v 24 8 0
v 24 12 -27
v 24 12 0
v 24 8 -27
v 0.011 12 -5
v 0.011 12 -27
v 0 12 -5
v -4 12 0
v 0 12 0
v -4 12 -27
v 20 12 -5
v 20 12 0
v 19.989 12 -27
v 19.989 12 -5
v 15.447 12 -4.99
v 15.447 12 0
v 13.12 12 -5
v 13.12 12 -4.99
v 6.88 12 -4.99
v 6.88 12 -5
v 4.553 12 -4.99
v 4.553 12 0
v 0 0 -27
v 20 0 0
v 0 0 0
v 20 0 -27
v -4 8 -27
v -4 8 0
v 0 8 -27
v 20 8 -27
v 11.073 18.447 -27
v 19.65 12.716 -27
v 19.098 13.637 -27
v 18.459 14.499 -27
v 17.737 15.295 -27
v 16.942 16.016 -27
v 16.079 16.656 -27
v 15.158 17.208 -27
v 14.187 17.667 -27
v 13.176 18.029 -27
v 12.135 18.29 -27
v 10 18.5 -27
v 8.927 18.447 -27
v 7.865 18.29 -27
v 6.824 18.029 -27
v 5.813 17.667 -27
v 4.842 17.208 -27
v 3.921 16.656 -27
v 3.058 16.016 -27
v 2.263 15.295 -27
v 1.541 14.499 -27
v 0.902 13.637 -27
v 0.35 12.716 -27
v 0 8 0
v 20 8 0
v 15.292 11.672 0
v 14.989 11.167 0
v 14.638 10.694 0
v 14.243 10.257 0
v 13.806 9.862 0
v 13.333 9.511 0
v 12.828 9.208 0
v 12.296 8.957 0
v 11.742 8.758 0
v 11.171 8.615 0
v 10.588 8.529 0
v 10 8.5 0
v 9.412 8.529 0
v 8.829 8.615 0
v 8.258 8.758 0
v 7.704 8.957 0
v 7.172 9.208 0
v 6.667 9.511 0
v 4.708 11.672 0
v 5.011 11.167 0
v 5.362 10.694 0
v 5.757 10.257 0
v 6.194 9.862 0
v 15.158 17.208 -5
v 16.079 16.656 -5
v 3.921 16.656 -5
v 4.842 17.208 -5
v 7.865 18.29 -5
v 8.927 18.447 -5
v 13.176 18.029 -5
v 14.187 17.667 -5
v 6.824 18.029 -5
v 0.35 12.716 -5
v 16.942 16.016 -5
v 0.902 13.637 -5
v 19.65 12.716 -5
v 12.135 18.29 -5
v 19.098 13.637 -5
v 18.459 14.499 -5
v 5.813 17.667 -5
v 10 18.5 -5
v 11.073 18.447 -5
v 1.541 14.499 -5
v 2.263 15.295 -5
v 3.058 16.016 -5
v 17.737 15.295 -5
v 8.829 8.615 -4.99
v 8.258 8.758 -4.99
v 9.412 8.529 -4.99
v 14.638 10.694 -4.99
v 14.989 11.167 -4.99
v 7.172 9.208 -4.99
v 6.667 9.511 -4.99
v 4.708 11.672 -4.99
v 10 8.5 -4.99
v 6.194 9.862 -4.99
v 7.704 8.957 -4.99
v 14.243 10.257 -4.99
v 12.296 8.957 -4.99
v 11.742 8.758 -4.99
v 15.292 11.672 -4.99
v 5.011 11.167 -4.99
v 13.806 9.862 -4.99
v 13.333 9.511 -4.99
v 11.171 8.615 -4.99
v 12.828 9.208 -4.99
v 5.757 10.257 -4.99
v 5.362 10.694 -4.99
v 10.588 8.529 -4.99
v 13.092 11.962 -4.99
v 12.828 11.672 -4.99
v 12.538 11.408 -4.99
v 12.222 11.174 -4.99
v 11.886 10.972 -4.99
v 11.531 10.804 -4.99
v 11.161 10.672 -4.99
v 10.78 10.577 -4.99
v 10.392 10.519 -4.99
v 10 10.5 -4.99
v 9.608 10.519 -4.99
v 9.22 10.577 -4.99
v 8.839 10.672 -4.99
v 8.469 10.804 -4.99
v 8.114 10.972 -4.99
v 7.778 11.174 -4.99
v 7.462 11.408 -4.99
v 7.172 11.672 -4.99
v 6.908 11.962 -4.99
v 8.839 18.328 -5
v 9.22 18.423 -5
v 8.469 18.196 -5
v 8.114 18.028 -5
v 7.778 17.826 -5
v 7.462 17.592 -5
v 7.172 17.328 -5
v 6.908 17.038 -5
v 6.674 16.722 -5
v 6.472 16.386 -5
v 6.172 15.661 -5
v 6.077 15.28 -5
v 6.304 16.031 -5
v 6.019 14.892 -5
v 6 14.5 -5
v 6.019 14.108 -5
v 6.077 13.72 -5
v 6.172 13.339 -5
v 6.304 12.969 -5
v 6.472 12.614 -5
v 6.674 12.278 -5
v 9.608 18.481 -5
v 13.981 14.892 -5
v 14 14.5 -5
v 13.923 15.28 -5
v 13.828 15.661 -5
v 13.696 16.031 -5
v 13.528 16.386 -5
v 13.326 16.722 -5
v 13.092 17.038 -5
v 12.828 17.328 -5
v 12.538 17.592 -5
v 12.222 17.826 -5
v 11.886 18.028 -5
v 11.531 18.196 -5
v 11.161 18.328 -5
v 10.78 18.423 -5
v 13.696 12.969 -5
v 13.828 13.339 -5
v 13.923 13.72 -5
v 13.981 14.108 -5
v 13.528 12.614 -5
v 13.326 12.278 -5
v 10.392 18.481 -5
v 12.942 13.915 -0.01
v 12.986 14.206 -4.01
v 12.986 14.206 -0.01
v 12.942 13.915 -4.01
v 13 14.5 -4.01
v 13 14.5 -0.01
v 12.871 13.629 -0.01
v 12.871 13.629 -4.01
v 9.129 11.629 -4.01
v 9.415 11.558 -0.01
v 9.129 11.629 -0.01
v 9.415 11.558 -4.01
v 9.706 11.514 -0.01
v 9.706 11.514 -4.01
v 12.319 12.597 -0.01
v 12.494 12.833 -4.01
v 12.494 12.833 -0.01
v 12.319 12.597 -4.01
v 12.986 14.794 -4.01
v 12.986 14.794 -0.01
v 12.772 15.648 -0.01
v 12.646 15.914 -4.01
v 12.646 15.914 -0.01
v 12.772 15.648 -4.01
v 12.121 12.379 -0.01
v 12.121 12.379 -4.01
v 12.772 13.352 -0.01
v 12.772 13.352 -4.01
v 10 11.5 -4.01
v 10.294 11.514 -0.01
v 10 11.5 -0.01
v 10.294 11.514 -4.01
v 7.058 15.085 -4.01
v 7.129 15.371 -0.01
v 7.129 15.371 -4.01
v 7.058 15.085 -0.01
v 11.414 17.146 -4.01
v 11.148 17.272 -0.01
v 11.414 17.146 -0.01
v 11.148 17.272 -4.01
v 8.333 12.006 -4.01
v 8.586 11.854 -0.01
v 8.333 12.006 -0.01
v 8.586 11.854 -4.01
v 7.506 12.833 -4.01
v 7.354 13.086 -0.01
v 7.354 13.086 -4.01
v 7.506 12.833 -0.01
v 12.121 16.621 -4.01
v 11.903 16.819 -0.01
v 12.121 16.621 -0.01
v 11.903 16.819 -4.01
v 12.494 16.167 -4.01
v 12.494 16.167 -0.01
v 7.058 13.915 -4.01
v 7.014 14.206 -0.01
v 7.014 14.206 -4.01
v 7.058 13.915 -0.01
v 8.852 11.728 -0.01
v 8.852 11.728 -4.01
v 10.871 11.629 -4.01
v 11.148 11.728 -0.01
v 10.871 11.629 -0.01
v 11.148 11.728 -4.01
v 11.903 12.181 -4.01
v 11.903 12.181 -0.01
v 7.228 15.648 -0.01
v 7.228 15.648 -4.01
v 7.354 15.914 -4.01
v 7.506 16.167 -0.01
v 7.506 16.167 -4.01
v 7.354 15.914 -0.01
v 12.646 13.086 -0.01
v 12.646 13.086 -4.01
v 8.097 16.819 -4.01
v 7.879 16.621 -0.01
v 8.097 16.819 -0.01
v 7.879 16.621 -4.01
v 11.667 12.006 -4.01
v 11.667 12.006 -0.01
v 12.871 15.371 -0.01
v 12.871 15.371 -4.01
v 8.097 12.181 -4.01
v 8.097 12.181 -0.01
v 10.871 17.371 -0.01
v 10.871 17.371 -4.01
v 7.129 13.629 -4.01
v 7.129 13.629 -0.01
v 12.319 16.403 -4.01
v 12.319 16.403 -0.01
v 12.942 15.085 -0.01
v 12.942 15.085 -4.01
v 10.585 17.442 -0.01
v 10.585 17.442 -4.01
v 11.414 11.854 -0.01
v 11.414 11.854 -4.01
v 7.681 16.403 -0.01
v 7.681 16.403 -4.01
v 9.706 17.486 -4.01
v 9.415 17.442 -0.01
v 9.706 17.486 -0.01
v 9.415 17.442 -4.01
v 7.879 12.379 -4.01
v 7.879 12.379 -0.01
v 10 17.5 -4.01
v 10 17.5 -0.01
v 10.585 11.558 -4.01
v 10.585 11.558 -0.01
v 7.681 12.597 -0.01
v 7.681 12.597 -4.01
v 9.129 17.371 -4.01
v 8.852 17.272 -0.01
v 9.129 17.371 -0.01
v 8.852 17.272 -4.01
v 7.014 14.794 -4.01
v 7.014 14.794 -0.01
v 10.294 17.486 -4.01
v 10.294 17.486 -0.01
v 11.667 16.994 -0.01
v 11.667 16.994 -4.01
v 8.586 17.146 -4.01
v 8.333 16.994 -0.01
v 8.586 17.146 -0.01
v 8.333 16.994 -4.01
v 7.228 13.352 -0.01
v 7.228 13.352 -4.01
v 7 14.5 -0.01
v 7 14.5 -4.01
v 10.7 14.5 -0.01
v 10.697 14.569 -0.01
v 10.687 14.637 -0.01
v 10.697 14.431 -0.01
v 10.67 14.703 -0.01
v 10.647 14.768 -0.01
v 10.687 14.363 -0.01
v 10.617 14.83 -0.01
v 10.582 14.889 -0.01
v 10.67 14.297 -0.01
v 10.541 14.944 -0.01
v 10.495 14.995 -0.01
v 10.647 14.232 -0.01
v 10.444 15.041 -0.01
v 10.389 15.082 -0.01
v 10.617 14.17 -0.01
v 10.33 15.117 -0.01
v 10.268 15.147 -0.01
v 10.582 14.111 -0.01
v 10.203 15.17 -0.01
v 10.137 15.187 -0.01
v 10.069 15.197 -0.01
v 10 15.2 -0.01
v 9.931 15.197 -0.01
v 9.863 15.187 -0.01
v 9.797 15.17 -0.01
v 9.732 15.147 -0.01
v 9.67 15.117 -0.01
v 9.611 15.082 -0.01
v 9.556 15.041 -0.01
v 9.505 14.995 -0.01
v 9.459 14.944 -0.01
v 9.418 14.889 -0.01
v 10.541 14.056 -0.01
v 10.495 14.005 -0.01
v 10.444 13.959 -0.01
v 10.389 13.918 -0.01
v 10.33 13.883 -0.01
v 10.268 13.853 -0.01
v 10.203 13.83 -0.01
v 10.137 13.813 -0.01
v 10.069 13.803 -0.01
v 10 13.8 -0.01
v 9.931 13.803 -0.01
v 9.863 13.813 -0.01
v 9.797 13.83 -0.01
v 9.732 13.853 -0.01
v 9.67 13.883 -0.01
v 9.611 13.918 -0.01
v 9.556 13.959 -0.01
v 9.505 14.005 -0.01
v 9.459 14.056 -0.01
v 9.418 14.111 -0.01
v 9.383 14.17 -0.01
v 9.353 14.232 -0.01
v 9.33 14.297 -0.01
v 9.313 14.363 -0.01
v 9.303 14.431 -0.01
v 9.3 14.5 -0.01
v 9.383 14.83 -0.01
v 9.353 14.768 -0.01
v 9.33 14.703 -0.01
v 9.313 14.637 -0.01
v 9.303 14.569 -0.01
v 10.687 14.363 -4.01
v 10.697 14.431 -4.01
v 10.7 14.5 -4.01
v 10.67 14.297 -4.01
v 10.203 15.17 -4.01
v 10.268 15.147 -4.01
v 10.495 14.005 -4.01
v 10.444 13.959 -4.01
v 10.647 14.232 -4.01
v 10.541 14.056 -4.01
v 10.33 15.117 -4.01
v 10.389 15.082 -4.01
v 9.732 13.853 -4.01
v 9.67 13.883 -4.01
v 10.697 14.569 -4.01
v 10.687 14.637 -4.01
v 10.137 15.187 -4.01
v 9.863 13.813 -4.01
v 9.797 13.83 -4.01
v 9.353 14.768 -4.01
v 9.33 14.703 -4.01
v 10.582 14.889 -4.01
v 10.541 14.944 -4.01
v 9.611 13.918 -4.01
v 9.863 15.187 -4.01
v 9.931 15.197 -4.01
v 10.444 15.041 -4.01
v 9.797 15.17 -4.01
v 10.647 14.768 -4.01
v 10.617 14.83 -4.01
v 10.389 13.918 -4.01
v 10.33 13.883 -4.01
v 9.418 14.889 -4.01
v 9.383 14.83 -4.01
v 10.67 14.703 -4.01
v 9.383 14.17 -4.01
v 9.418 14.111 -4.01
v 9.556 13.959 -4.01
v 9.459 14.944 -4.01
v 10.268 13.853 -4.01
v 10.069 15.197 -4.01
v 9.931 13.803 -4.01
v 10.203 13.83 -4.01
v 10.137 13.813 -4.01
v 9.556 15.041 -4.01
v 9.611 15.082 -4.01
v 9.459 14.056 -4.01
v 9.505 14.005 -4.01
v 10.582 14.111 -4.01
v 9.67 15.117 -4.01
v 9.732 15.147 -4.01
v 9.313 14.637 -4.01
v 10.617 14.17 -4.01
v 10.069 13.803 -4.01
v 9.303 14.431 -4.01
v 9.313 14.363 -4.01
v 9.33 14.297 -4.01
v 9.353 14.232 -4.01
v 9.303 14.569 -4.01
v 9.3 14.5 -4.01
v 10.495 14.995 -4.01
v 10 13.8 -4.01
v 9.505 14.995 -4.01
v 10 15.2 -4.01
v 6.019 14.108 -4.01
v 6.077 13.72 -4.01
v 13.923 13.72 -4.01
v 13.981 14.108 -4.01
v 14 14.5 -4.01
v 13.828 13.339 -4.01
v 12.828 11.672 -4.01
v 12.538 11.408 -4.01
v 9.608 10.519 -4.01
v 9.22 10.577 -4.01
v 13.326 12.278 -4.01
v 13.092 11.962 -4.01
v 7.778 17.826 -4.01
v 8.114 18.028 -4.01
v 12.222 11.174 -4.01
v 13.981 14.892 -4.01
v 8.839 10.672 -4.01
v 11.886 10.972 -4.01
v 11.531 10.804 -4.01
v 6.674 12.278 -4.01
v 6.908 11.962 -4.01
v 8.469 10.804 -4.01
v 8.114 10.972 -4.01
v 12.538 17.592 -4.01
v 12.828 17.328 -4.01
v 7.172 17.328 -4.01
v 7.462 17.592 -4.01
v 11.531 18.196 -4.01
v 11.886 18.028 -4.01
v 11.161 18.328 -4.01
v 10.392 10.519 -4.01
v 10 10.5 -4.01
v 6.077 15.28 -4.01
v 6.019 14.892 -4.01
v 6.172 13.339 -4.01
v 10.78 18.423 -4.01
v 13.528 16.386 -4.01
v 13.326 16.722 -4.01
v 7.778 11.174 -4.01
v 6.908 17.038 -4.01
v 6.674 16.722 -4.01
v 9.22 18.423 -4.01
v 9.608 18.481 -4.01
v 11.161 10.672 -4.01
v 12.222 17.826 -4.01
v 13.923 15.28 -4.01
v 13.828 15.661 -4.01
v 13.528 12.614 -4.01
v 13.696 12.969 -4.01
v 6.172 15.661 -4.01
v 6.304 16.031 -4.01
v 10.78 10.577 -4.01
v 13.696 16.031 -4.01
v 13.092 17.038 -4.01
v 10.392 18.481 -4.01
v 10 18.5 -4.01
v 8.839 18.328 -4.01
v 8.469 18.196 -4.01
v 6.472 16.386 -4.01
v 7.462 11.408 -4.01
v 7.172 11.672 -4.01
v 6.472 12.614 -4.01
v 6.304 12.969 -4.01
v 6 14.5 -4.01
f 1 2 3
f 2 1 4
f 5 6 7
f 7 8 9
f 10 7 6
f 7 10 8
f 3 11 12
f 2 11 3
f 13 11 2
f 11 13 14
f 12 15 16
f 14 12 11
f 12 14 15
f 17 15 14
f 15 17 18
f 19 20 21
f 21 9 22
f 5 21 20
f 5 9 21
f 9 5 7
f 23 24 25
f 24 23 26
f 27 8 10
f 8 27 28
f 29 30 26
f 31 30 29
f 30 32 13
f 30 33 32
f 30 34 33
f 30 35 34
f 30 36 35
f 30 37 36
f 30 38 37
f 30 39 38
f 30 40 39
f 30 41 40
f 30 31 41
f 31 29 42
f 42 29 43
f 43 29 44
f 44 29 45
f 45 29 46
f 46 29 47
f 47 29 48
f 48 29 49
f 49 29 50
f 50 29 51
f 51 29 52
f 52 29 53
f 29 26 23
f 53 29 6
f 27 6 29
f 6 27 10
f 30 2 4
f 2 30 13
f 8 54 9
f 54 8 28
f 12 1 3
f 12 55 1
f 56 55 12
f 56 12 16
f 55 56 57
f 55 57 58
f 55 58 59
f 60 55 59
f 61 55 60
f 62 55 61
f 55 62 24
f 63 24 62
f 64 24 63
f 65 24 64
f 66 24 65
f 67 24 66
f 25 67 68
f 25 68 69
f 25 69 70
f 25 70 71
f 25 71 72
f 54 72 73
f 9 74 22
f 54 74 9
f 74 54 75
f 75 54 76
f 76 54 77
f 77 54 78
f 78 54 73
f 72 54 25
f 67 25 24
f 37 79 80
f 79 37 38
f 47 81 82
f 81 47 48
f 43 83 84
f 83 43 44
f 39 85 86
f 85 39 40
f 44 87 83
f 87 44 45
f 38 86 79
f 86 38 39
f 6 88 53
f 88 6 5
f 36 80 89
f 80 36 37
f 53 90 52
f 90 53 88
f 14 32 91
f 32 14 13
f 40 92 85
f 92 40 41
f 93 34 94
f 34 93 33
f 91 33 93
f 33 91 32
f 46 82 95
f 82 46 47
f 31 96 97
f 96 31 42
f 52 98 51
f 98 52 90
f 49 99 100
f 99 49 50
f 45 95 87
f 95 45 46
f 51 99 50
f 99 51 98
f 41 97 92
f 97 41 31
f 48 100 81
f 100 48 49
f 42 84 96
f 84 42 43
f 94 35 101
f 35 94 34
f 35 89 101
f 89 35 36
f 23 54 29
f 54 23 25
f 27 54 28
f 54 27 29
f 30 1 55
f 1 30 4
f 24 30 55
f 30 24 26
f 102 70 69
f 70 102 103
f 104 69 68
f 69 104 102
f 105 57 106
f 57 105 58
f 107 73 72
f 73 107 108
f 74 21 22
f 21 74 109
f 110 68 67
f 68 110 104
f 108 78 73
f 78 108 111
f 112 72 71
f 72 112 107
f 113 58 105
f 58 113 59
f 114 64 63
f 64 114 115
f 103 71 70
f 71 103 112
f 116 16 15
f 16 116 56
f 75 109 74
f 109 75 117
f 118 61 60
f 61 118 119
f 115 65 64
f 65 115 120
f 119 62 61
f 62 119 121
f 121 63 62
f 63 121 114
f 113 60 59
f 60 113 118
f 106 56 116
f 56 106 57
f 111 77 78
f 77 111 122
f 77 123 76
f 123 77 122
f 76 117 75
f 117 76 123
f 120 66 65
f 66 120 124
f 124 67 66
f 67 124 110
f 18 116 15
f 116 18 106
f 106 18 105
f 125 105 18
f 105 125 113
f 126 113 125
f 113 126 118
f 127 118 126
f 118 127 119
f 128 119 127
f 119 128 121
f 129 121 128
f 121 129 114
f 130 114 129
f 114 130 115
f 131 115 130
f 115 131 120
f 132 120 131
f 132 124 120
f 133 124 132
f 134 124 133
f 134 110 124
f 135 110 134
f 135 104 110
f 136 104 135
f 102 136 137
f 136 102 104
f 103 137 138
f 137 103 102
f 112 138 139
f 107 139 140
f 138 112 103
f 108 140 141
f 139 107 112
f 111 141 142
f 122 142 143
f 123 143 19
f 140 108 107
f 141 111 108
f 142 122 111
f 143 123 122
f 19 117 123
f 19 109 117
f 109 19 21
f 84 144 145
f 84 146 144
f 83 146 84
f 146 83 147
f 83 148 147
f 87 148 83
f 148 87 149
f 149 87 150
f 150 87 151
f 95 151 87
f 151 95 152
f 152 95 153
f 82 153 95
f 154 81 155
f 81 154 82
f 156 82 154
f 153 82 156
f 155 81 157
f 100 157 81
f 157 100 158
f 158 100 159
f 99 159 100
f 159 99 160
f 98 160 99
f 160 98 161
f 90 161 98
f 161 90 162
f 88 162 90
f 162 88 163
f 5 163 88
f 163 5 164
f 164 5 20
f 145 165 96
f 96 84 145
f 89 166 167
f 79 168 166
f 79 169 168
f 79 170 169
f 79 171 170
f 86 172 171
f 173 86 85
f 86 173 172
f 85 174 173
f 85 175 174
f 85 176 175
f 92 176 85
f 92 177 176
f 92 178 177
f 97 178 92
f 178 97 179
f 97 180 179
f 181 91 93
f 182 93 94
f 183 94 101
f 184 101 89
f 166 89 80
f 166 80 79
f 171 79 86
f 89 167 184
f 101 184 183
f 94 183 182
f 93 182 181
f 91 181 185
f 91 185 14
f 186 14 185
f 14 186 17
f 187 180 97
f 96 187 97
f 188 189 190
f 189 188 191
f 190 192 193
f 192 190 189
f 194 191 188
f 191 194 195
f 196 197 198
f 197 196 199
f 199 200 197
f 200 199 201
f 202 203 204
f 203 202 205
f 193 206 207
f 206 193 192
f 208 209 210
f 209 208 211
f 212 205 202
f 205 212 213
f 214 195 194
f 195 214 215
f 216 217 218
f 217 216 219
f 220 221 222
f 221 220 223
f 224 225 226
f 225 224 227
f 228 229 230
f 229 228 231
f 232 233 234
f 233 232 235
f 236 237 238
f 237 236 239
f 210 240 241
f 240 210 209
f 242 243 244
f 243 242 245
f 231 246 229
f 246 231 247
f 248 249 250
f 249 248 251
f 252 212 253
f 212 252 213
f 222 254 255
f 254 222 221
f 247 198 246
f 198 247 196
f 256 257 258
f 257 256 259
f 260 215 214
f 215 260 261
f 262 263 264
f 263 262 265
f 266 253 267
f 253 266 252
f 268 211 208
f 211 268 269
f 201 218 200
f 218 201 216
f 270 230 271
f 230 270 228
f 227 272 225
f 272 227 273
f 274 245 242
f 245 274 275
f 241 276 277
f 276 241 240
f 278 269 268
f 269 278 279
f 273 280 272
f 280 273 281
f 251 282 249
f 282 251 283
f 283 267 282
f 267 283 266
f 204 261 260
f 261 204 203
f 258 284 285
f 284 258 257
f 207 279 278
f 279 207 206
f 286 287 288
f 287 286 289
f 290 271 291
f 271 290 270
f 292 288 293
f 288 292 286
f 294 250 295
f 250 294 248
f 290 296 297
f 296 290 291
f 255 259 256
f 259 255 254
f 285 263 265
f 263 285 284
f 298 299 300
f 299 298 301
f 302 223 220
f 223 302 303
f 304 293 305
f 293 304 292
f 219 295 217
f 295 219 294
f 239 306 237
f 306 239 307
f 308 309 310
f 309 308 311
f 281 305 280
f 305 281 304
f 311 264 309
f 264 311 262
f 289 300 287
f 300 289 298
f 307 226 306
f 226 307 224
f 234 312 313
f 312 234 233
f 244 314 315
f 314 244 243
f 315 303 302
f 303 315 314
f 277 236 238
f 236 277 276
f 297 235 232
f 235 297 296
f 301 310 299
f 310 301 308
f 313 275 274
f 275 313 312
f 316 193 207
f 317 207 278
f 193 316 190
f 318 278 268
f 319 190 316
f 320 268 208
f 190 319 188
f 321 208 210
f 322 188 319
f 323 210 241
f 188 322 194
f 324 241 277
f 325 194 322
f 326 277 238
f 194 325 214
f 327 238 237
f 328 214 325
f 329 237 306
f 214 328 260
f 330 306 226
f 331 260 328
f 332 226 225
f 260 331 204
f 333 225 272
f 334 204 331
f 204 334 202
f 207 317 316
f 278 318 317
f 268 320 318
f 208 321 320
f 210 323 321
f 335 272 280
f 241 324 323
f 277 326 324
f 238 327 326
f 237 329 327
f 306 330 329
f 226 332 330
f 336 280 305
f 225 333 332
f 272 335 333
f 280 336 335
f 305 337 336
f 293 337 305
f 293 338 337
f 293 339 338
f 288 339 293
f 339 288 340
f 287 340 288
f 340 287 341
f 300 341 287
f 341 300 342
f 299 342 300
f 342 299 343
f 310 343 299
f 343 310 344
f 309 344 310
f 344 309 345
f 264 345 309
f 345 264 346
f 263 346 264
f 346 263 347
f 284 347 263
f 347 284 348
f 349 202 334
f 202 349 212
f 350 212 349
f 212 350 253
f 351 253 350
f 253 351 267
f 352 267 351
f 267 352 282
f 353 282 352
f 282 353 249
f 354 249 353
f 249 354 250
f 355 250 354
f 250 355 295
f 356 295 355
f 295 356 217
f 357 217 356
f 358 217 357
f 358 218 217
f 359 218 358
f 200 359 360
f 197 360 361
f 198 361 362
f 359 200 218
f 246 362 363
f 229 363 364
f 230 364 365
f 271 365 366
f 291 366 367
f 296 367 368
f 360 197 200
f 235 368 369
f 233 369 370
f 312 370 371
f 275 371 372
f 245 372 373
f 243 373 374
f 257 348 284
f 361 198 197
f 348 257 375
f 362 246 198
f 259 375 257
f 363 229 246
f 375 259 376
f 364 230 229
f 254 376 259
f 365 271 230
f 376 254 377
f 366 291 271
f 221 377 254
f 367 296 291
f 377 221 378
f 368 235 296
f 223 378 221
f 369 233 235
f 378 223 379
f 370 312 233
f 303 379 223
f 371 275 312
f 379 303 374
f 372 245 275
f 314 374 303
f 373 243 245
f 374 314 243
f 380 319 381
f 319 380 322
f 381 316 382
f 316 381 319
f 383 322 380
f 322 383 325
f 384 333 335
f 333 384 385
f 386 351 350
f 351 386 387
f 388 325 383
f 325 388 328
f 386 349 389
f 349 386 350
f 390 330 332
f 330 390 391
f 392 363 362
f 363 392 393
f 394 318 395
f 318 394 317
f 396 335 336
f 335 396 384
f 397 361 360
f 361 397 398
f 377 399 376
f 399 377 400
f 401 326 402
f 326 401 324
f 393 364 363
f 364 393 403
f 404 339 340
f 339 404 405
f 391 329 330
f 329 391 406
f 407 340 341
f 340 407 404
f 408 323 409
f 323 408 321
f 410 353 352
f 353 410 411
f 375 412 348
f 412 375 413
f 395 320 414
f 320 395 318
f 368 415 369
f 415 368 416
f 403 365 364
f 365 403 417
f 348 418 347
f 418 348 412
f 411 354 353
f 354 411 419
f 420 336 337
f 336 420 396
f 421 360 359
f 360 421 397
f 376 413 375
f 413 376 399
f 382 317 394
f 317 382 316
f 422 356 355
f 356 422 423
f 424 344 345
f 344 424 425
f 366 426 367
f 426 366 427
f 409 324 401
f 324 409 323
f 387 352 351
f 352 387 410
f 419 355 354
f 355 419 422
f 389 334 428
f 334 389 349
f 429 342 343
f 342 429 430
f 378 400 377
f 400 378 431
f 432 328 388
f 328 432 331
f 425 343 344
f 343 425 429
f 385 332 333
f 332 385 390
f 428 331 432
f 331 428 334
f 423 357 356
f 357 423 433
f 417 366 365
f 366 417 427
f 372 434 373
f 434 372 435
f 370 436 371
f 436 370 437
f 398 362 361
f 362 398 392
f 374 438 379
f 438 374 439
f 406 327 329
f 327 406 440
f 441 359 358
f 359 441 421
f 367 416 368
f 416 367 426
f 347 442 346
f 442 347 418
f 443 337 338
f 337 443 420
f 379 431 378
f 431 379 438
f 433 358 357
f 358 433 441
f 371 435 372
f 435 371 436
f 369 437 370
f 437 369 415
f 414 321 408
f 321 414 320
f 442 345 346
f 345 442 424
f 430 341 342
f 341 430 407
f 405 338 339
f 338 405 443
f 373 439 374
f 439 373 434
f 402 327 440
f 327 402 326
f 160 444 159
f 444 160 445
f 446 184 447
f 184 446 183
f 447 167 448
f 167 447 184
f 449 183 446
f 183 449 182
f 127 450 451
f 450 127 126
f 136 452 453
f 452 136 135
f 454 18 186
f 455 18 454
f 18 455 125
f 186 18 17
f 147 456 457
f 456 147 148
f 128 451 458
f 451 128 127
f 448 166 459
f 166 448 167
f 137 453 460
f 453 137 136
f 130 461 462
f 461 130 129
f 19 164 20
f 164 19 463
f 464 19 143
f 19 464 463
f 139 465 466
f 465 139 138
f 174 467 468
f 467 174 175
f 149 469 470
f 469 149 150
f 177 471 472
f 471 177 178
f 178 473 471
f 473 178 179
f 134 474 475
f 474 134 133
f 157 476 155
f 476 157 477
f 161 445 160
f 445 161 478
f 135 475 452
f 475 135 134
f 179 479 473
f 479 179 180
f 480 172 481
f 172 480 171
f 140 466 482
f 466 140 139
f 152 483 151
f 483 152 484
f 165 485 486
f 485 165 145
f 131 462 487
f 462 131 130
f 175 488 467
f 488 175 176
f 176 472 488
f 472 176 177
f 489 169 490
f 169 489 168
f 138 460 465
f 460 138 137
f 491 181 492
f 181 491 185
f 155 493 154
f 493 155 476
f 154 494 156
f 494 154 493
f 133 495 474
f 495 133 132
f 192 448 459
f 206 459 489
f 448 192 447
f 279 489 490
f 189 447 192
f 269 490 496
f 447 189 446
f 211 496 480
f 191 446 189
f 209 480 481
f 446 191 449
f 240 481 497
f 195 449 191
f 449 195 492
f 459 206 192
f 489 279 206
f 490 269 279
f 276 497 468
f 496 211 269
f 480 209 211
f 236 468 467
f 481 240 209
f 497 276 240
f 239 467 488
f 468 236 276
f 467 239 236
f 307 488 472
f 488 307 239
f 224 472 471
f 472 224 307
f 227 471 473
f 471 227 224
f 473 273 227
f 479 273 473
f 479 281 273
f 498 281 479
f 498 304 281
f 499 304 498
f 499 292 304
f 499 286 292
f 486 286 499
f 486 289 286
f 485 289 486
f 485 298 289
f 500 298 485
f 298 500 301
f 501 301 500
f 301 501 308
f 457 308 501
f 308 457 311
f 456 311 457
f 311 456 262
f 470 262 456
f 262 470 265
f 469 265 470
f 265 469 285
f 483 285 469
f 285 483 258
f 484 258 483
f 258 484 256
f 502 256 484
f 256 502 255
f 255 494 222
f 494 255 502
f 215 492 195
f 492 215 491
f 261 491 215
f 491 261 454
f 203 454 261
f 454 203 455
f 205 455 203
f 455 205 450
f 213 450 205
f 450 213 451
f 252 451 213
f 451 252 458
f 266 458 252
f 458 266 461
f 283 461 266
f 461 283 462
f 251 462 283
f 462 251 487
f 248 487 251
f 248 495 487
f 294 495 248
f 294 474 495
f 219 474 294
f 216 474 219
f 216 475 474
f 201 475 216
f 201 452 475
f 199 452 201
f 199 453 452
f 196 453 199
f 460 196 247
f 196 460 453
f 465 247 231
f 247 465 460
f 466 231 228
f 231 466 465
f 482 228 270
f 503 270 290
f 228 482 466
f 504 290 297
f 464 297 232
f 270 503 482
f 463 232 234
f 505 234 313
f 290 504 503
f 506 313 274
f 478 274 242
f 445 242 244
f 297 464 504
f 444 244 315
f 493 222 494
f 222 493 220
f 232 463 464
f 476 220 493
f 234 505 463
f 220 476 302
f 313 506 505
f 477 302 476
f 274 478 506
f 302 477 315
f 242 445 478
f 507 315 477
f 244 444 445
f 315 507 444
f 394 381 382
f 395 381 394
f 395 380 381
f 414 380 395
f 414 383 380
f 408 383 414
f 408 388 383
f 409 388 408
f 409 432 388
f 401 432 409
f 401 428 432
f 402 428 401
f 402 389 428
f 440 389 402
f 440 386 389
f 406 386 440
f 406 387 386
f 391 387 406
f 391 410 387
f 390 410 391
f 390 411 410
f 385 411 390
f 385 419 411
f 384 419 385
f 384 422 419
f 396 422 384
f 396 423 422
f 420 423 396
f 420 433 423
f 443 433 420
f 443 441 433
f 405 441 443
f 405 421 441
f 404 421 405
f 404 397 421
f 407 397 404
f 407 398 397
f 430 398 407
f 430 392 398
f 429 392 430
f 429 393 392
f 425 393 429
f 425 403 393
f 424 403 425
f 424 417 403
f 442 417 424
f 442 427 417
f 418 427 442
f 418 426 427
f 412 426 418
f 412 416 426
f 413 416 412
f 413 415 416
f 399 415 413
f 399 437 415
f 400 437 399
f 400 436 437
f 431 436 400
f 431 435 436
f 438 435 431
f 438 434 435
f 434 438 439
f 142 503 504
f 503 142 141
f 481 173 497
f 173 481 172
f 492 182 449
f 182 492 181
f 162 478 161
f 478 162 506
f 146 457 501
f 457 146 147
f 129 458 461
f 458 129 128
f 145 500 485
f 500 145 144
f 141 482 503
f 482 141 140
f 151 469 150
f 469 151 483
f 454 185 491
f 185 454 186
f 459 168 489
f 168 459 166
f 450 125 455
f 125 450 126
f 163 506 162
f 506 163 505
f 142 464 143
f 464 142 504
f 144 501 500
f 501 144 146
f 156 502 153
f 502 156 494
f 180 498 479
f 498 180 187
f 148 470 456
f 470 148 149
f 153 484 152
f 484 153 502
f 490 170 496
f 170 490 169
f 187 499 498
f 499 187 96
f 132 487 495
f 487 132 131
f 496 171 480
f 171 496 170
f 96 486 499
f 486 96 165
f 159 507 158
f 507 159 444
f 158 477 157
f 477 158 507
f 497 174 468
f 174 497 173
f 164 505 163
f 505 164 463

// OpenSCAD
$fn = 64;

module bb_test(r1=5, r2=12, h=5) {
    rotate([90,0,0]) difference() {
        cylinder(r=r2, h=h);
        translate([0,0,-1]) cylinder(r=r1, h=h+2);
    }
}

module um_ballbearing_holder( bbr1=6/2, bbr2=10/2, bbw=3 ) {
    x1 = 20;
    y1 = 27;
    z1 = 12;
    wallwidth = 6;
    holdwidth = 4;
    dwbb = 1; // distance wall to ball bearing
    roar = bbr1 + 1; // radius of abstandsring
    hwatb = 6.5; // height wooden arc to baseline
    bboff = 1; // so viel steht das kugellager oben über
    hma = z1+hwatb-bbr2+bboff; // hoehe mittelachse
    rfs = 0.7; // radius fixierschraube
    x2 = x1+2*wallwidth+2*holdwidth;
    z2 = 2*holdwidth;
    rbig = (pow(hwatb,2)+pow(x1/2,2))/(2*hwatb);

    union() {
        difference() {
            // mittelteil
            intersection() {
                union() {
                    translate([-holdwidth,0,0])cube([x1+2*holdwidth,y1,z1]);
                    translate([x1/2,0,-rbig+z1+hwatb])rotate([-90,0,0]) cylinder(h=y1, r=rbig, $fn = 64);
                }
                translate([-holdwidth,0,0])cube([x1+2*holdwidth,y1,z1*2]);
            }
            translate([-wallwidth,-1,-holdwidth]) cube([wallwidth, y1+2,z1]);
            translate([x1,-1,-holdwidth]) cube([wallwidth, y1+2,z1]);

            translate([x1/2,-0.01,hma]) rotate([-90,0,0]) cylinder(r=bbr2+bboff, h=bbw+2*dwbb);

            translate([0,0,z1]) cube([x1, bbw+2*dwbb, rbig]);
        }
        // achse
        difference() {
            translate([x1/2,0.01,hma]) rotate([-90,0,0]) cylinder(r=bbr1, h=bbw+2*dwbb);
            translate([x1/2,-0.01,hma]) rotate([-90,0,0]) cylinder(r=rfs, h=0.7*y1+1);
        }
        translate([x1/2,bbw+dwbb+0.01,hma]) rotate([-90,0,0]) cylinder(r=roar, h=dwbb);
    }
    // TESTING ONLY
    //translate([x1/2, bbw+dwbb, hma]) bb_test(r1=bbr1, r2=bbr2, h=bbw);
}

rotate([-90,0,0]) 
  // small 6/10/3 ball bearing for alternate extrusion feeder
  um_ballbearing_holder(bbr1=6/2, bbr2=10/2, bbw=3);
  // Heiko's alternative bbs
  //um_ballbearing_holder(bbr1=6/2, bbr2=19/2, bbw=6);
